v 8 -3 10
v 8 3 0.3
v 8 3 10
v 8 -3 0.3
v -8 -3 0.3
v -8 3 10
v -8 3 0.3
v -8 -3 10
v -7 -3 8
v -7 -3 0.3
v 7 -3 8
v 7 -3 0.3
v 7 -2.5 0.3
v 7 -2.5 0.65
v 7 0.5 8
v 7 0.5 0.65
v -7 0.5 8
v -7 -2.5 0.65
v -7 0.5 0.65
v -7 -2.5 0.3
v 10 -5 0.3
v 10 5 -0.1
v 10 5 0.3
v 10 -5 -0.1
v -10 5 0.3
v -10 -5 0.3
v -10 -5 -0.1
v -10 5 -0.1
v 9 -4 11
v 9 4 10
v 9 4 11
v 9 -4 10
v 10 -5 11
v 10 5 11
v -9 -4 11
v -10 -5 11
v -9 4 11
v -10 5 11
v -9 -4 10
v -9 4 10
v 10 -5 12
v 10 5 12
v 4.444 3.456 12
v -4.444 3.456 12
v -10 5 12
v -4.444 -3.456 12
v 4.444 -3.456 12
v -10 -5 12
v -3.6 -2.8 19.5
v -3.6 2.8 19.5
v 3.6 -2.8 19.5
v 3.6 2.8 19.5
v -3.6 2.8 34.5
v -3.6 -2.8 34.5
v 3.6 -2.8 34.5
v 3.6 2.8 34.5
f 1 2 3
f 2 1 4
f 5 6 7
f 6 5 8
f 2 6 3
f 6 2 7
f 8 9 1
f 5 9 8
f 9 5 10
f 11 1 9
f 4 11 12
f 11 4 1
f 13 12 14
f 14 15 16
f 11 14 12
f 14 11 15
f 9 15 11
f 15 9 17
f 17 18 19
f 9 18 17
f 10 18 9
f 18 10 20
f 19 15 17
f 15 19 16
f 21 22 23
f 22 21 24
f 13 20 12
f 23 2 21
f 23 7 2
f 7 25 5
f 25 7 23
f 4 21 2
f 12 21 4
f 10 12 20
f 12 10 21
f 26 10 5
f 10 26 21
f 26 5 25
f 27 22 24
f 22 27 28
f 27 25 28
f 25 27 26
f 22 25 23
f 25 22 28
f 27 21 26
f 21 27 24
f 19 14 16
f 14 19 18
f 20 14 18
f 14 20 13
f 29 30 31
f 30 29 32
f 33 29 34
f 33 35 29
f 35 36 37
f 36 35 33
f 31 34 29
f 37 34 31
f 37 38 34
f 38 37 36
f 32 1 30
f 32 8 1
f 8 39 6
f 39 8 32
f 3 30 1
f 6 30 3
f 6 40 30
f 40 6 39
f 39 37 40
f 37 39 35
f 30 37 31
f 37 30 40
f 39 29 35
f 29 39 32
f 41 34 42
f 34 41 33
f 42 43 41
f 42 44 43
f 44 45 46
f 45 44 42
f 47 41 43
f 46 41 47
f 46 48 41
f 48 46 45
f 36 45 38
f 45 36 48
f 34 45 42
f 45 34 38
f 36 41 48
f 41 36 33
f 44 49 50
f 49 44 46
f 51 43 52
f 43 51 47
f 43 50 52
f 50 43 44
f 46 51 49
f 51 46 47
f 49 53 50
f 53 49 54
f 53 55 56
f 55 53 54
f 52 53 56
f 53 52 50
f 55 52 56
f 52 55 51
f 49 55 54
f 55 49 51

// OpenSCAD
module Fireplace_01(){   
    translate([0,0,0.1])
    color("gray")
    cube([20,10,0.4], center= true);

    difference(){
    
        translate([0,0,0.2+5])
        color("#b65454")
        cube([16,6,10], center= true);


        translate([0,-2,4])
        color("#842020")
        cube([14,5,8], center= true);

    }

    translate([0,-1,0.4])
    color("#786565")
    cube([15,3,0.5], center= true);

    translate([0,0,10.5])
    color("gray")
    cube([18,8,1], center= true);

    translate([0,0,11.5])
    color("black")
    cube([20,10,1], center= true);

    translate([0,0,11.5])
    color("#b65454")
    linear_extrude(height = 8, scale = 0.8) 
    square([9,7], center = true);

    translate([0,0,19.5])
    color("#b65454")
    linear_extrude(height = 15, scale = 1) 
    square([9 *0.8,7 *0.8], center = true);

}

Fireplace_01();

// Written by Nicolì Angelo (Gengio) 2024: 
// MIT License

//Permission is hereby granted, free of charge, to any person obtaining a copy of this software and associated documentation files (the "Software"), to deal in the Software without restriction, including without limitation the rights to use, copy, modify, merge, publish, distribute, sublicense, and/or sell copies of the Software, and to permit persons to whom the Software is furnished to do so, subject to the following conditions:

//The above copyright notice and this permission notice shall be included in all copies or substantial portions of the Software.

//THE SOFTWARE IS PROVIDED "AS IS", WITHOUT WARRANTY OF ANY KIND, EXPRESS OR IMPLIED, INCLUDING BUT NOT LIMITED TO THE WARRANTIES OF MERCHANTABILITY, FITNESS FOR A PARTICULAR PURPOSE AND NONINFRINGEMENT. IN NO EVENT SHALL THE AUTHORS OR COPYRIGHT HOLDERS BE LIABLE FOR ANY CLAIM, DAMAGES OR OTHER LIABILITY, WHETHER IN AN ACTION OF CONTRACT, TORT OR OTHERWISE, ARISING FROM, OUT OF OR IN CONNECTION WITH THE SOFTWARE OR THE USE OR OTHER DEALINGS IN THE SOFTWARE.
